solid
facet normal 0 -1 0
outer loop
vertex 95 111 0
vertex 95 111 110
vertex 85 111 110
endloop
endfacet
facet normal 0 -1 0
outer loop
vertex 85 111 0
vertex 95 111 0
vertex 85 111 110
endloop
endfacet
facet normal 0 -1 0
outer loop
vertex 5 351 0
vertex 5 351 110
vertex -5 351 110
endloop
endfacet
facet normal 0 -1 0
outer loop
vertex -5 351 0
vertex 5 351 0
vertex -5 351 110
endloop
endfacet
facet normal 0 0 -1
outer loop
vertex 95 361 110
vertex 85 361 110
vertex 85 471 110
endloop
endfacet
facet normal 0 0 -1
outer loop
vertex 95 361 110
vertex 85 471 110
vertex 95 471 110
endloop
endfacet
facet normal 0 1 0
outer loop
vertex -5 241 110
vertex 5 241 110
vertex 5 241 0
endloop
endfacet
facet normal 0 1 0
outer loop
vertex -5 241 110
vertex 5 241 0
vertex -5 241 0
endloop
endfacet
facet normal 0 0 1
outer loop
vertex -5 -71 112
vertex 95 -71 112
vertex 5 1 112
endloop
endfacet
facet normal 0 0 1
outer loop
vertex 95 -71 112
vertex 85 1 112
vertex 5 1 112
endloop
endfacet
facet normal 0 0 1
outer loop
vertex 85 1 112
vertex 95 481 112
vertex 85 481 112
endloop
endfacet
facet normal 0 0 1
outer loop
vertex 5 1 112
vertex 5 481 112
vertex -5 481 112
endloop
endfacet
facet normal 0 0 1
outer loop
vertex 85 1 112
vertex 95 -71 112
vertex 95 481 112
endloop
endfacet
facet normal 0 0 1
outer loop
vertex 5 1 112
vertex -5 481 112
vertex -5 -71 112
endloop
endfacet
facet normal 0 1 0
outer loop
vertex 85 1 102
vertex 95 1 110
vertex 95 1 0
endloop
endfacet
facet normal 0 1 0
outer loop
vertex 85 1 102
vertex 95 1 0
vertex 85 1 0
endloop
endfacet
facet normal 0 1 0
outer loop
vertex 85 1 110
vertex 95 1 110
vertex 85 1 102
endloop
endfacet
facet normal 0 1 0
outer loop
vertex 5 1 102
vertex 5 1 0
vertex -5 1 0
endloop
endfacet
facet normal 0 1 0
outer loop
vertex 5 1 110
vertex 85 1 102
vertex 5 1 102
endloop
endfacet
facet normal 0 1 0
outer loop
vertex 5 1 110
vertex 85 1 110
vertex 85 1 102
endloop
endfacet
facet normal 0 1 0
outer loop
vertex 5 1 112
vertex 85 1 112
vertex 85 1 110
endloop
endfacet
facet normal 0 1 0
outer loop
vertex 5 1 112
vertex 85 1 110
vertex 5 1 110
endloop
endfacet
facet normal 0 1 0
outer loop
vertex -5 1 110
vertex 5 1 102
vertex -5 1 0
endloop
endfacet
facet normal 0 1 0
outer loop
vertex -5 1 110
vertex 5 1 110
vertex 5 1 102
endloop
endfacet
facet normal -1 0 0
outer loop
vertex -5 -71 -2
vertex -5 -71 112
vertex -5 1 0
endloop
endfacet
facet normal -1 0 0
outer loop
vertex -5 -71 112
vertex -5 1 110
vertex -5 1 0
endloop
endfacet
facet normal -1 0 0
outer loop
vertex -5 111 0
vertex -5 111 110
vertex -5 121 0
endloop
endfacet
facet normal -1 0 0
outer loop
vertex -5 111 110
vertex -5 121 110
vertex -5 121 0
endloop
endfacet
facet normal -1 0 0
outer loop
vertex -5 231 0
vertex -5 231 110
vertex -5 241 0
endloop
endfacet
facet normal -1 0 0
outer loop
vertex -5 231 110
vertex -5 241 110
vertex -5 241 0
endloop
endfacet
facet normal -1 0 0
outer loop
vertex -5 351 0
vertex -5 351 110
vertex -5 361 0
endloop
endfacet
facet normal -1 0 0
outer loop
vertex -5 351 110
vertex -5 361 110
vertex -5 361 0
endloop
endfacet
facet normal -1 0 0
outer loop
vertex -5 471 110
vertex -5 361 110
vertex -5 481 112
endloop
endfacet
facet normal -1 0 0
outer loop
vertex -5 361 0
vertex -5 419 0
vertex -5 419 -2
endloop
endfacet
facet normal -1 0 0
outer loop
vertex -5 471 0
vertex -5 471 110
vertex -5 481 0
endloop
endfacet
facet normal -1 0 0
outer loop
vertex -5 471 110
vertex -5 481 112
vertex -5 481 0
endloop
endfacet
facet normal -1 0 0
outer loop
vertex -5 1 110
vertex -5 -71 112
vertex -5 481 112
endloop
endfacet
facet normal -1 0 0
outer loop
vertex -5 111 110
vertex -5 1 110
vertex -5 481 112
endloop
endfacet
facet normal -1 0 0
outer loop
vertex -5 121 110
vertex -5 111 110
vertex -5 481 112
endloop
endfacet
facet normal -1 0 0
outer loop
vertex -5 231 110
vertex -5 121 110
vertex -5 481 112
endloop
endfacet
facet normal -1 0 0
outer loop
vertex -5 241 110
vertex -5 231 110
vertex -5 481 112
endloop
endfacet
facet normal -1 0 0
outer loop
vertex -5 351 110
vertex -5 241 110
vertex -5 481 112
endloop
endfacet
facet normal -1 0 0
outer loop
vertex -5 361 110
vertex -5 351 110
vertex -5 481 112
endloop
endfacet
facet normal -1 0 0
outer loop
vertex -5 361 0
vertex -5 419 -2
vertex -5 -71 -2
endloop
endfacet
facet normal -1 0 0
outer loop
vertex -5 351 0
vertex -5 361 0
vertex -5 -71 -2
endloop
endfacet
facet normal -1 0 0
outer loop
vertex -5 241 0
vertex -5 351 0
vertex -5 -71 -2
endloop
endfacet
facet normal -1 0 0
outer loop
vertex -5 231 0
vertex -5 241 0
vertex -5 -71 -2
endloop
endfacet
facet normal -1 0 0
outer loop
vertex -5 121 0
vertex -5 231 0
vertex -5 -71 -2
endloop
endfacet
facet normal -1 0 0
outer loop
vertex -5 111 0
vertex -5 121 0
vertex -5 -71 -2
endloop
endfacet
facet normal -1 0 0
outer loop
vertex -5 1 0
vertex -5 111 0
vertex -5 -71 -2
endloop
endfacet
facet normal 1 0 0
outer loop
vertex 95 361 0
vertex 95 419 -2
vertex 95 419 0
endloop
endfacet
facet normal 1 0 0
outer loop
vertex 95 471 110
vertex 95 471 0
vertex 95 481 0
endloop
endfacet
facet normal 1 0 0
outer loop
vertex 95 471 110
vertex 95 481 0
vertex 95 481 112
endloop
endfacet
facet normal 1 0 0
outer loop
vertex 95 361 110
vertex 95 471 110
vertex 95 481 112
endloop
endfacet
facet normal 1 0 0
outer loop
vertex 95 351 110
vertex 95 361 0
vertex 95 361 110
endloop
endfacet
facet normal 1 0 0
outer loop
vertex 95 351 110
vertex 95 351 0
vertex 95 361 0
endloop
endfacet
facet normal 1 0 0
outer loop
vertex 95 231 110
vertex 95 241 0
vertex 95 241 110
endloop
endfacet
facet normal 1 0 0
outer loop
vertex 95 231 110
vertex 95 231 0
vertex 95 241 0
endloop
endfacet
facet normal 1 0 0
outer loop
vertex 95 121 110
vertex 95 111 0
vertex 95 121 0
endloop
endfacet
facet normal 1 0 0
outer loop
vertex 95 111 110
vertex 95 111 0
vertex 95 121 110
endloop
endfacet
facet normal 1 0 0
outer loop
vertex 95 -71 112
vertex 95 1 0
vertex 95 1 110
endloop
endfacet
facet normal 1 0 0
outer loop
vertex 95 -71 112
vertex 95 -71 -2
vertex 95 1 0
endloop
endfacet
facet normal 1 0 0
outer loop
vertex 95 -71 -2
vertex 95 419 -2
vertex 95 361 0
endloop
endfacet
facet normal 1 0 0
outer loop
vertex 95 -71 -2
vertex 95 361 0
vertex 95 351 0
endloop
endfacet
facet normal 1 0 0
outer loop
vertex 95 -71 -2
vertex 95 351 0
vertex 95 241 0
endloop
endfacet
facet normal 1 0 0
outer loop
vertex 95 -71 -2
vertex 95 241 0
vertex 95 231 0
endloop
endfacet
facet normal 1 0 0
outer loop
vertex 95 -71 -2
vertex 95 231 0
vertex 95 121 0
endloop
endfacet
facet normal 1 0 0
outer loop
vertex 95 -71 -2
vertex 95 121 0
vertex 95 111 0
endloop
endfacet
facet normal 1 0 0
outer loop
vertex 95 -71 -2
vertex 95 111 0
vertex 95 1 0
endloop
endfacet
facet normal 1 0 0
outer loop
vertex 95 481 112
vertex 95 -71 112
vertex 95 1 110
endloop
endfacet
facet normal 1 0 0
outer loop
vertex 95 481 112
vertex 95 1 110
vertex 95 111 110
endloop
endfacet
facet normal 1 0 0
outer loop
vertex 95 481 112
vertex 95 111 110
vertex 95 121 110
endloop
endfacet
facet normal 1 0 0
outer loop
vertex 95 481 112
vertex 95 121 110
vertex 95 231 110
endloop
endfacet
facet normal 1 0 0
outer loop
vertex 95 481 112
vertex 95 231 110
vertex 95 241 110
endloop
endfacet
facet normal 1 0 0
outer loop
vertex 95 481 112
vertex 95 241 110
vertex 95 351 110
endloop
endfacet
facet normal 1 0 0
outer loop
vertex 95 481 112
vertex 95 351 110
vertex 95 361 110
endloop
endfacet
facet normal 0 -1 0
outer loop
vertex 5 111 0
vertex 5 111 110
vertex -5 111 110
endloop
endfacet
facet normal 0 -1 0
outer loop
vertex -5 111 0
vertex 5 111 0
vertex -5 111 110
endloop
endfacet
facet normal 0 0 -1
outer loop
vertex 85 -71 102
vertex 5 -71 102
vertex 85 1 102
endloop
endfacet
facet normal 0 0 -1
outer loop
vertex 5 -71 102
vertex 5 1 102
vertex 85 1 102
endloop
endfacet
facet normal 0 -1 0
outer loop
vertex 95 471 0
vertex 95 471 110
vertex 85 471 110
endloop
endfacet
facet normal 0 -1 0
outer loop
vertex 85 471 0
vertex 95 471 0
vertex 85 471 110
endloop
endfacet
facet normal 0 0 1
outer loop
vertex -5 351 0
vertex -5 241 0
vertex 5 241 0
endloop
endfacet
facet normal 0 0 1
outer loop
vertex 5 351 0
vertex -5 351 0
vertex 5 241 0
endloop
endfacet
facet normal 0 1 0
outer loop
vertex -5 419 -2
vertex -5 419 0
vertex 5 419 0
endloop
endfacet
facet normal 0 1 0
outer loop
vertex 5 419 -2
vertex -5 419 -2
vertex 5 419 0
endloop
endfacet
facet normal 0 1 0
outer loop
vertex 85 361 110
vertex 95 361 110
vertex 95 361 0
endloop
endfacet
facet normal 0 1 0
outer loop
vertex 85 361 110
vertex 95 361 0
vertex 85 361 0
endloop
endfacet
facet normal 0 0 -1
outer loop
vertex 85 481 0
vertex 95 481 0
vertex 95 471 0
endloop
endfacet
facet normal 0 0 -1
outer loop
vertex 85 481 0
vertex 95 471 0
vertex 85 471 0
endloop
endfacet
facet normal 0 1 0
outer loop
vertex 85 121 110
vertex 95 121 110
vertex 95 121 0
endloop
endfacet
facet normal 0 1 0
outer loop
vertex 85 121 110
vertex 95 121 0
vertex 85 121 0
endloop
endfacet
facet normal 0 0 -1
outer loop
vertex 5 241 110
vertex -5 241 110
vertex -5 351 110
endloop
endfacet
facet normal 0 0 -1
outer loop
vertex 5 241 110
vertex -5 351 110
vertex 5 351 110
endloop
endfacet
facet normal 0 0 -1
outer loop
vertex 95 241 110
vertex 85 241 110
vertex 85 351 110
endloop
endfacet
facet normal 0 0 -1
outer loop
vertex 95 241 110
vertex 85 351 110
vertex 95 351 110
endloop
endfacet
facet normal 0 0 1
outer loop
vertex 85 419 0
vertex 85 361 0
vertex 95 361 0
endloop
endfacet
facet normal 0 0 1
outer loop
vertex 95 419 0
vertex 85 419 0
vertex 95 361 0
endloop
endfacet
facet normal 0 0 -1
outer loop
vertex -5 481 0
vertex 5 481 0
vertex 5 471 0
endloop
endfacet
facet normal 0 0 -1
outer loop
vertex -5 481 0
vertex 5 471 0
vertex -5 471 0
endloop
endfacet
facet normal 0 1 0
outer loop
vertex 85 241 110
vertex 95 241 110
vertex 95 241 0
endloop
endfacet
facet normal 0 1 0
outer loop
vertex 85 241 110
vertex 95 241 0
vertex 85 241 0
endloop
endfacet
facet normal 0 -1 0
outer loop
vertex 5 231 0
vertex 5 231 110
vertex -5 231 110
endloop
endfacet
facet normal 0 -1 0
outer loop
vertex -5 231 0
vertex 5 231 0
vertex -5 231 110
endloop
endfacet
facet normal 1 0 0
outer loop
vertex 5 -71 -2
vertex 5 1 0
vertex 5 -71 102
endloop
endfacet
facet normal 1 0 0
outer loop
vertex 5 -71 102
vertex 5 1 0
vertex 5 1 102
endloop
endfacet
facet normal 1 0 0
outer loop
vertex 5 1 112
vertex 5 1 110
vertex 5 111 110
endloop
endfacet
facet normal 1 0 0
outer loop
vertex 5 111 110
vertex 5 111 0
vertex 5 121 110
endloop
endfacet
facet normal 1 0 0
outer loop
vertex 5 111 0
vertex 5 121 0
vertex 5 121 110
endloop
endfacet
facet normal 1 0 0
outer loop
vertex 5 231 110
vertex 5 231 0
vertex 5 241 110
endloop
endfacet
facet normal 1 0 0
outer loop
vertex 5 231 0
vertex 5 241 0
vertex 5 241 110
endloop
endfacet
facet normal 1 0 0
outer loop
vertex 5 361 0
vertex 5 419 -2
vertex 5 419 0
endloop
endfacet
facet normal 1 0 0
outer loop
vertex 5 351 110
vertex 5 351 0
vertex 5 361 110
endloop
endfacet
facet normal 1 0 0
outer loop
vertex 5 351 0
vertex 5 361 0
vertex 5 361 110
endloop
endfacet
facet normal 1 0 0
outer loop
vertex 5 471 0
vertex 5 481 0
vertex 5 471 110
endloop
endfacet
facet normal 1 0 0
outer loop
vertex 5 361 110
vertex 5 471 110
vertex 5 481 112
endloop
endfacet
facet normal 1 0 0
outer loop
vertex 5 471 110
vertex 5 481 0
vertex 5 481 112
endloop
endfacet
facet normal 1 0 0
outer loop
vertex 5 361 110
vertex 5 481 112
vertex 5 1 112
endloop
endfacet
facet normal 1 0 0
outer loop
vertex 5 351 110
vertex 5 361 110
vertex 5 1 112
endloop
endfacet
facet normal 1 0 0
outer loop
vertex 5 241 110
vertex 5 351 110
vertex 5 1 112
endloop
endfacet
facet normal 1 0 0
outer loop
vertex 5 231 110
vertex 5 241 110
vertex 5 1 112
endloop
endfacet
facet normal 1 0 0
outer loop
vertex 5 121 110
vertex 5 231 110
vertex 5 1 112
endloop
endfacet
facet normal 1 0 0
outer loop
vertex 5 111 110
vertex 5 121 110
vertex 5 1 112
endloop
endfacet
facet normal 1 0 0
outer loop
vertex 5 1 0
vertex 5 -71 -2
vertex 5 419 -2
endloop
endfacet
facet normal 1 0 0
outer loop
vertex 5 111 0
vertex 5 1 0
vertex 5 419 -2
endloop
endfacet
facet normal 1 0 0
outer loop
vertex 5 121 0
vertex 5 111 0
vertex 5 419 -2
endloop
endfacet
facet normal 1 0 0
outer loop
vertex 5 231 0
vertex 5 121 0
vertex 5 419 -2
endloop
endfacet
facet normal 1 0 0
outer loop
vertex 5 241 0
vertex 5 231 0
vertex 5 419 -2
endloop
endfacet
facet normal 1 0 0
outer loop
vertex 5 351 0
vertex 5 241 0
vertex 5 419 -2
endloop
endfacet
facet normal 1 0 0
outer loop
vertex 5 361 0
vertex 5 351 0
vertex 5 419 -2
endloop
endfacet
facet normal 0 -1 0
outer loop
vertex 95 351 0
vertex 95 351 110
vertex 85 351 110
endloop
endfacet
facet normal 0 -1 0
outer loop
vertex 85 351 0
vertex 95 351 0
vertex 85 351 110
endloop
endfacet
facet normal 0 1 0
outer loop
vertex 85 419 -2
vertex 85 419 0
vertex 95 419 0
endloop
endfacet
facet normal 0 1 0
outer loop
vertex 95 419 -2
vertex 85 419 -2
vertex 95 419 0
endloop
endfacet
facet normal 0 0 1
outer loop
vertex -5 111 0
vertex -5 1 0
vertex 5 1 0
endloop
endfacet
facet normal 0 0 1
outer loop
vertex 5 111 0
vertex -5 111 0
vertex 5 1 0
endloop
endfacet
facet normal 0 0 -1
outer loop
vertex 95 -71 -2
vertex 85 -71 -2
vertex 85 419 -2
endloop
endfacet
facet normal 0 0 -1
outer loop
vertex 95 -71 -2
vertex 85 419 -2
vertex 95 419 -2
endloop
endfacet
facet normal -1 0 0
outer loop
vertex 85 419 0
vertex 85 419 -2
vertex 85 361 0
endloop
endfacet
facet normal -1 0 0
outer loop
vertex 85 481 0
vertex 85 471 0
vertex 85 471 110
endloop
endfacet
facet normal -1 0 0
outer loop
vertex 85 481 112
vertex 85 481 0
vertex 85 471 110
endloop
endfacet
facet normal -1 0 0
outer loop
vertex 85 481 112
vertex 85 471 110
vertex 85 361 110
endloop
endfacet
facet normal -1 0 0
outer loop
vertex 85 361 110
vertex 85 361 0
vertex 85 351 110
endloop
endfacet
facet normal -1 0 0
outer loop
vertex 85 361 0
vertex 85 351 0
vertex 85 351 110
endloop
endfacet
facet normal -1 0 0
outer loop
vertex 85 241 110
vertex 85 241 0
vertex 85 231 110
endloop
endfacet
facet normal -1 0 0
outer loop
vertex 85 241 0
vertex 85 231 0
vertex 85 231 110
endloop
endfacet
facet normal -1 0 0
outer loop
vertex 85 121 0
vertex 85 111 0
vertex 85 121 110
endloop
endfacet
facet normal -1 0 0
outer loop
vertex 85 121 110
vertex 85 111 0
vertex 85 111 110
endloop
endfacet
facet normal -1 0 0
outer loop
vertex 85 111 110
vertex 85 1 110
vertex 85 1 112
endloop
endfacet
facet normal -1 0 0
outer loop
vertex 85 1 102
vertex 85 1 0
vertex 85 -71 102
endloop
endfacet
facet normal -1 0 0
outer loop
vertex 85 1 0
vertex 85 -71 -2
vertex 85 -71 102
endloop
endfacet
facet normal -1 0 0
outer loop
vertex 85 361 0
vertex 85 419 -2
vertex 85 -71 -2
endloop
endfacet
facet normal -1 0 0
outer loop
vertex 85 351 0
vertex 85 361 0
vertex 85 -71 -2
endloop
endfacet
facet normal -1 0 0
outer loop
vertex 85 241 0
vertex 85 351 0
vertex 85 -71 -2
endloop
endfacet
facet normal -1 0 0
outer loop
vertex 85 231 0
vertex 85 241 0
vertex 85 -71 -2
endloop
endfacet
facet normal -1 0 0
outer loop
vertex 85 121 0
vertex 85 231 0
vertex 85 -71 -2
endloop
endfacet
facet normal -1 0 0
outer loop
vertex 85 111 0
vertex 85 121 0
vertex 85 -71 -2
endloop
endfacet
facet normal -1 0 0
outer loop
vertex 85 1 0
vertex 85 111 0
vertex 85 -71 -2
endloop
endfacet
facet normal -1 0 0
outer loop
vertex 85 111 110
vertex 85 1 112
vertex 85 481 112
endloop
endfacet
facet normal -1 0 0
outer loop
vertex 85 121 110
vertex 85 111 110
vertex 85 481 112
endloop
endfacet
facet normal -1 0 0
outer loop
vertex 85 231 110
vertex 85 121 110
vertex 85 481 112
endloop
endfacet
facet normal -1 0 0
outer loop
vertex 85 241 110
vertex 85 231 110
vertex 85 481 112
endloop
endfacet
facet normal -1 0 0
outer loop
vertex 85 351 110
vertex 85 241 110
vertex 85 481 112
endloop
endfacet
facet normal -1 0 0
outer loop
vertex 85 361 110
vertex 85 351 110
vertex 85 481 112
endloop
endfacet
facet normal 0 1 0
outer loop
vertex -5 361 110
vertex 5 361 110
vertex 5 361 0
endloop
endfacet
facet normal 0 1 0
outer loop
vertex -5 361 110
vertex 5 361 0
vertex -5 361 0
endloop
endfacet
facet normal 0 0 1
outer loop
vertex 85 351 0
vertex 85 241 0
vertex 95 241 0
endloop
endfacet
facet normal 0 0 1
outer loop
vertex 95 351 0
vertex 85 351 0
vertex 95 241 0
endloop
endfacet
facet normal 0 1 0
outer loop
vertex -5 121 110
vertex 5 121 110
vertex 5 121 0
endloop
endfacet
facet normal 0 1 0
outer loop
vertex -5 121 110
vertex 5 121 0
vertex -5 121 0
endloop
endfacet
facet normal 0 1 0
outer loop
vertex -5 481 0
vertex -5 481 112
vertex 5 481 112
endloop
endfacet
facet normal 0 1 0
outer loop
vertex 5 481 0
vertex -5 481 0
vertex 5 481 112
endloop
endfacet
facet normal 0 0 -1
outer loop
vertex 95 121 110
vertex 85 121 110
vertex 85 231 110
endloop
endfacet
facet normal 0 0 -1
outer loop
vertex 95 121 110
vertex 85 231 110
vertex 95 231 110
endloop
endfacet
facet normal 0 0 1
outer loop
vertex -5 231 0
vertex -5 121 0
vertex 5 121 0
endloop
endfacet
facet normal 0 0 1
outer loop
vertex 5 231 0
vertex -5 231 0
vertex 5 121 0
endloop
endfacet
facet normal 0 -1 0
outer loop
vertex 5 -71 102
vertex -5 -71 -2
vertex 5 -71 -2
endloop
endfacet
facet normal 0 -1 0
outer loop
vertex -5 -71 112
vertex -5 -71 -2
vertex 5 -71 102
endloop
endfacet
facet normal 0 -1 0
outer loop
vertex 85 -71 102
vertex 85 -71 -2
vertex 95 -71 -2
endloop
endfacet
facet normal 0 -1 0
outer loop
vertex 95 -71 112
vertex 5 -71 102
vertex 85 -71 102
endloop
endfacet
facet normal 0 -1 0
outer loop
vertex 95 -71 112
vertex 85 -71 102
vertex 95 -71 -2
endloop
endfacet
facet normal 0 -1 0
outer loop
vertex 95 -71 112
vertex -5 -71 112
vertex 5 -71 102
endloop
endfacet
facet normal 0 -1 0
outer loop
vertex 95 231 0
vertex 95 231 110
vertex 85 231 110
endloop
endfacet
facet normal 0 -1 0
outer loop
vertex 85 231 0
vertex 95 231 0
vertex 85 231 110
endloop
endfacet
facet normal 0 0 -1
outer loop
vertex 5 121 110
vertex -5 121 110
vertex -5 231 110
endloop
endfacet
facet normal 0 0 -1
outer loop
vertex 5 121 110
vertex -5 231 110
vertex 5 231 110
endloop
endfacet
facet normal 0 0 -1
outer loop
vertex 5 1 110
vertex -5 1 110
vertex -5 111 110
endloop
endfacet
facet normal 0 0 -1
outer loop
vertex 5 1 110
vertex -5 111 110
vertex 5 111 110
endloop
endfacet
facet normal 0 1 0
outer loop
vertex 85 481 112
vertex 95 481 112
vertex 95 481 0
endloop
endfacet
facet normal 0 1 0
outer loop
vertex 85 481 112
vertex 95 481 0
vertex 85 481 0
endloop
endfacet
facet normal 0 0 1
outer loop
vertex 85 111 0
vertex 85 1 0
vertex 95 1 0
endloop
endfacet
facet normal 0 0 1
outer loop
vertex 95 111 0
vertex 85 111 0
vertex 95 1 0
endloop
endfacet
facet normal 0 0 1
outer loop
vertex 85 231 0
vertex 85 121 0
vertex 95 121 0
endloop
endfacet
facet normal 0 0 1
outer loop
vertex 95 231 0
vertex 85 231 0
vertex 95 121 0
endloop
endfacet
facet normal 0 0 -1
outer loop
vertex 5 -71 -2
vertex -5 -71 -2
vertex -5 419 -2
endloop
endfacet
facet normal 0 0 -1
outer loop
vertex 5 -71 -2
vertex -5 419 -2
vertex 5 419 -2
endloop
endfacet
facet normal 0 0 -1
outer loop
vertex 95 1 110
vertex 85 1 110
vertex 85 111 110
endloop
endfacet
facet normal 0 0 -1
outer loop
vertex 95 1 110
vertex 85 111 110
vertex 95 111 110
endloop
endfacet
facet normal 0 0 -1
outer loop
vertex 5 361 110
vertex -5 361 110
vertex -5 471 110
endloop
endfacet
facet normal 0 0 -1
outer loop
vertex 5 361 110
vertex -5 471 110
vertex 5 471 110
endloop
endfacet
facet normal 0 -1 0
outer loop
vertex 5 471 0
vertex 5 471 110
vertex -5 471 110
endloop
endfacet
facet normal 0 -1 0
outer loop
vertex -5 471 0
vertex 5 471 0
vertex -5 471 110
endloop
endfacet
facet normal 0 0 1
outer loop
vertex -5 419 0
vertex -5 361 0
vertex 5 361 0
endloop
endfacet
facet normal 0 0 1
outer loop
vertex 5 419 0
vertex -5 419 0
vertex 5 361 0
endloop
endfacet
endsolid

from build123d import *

# Parameters (mm, degrees)
SKETCH1_W            = 10
SKETCH1_H            = 2
BOSS_EXTRUDE1_DEPTH  = 112
SKETCH2_W            = 10
SKETCH2_H            = 2
BOSS_EXTRUDE2_DEPTH  = 480
SKETCH3_W            = 10
SKETCH3_H            = 2
BOSS_EXTRUDE3_DEPTH  = 90
SKETCH4_W            = 10
SKETCH4_H            = 2
BOSS_EXTRUDE4_DEPTH  = 102
SKETCH5_W            = 10
SKETCH5_H            = 2
BOSS_EXTRUDE5_DEPTH  = 480
SKETCH6_W            = 10
SKETCH6_H            = 10
BOSS_EXTRUDE6_DEPTH  = 110
SKETCH7_W            = 10
SKETCH7_H            = 10
BOSS_EXTRUDE7_DEPTH  = 110
SKETCH8_W            = 10
SKETCH8_H            = 10
BOSS_EXTRUDE8_DEPTH  = 110
SKETCH9_W            = 10
SKETCH9_H            = 10
BOSS_EXTRUDE9_DEPTH  = 110
BOSS_EXTRUDE10_DEPTH = 70
SKETCH12_W           = 10
SKETCH12_H           = 2
BOSS_EXTRUDE11_DEPTH = 490


with BuildPart() as part:
    # Sketch1 → Boss-Extrude1 (new body)
    with BuildSketch(Plane.XY):
        Rectangle(SKETCH1_W, SKETCH1_H)
    extrude(amount=BOSS_EXTRUDE1_DEPTH)

    # Sketch2 → Boss-Extrude2 (add)
    with BuildSketch(Plane(origin=(0, 1, 0), x_dir=(1, 0, 0), z_dir=(0, 1, 0))):
        with Locations((0, -111)):
            Rectangle(SKETCH2_W, SKETCH2_H)
    extrude(amount=BOSS_EXTRUDE2_DEPTH)

    # Sketch3 → Boss-Extrude3 (add)
    with BuildSketch(Plane(origin=(5, 0, 0), x_dir=(0, 0, -1), z_dir=(1, 0, 0))):
        with Locations((-107, 0)):
            Rectangle(SKETCH3_W, SKETCH3_H)
    extrude(amount=BOSS_EXTRUDE3_DEPTH)

    # Sketch4 → Boss-Extrude4 (add)
    with BuildSketch(Plane(origin=(0, 0, 102), x_dir=(-1, 0, 0), z_dir=(0, 0, -1))):
        with Locations((-90, 0)):
            Rectangle(SKETCH4_W, SKETCH4_H)
    extrude(amount=BOSS_EXTRUDE4_DEPTH)

    # Sketch5 → Boss-Extrude5 (add)
    with BuildSketch(Plane(origin=(0, 1, 0), x_dir=(1, 0, 0), z_dir=(0, 1, 0))):
        with Locations((90, -111)):
            Rectangle(SKETCH5_W, SKETCH5_H)
    extrude(amount=BOSS_EXTRUDE5_DEPTH)

    # Sketch6 → Boss-Extrude6 (add)
    with BuildSketch(Plane(origin=(0, 0, 110), x_dir=(-1, 0, 0), z_dir=(0, 0, -1))):
        with Locations((-90, 116)):
            Rectangle(SKETCH6_W, SKETCH6_H)
        with Locations((0, 116)):
            Rectangle(SKETCH6_W, SKETCH6_H)
    extrude(amount=BOSS_EXTRUDE6_DEPTH)

    # Sketch7 → Boss-Extrude7 (add)
    with BuildSketch(Plane(origin=(0, 0, 110), x_dir=(-1, 0, 0), z_dir=(0, 0, -1))):
        with Locations((-90, 236)):
            Rectangle(SKETCH7_W, SKETCH7_H)
        with Locations((0, 236)):
            Rectangle(SKETCH7_W, SKETCH7_H)
    extrude(amount=BOSS_EXTRUDE7_DEPTH)

    # Sketch8 → Boss-Extrude8 (add)
    with BuildSketch(Plane(origin=(0, 0, 110), x_dir=(-1, 0, 0), z_dir=(0, 0, -1))):
        with Locations((-90, 356)):
            Rectangle(SKETCH8_W, SKETCH8_H)
        with Locations((0, 356)):
            Rectangle(SKETCH8_W, SKETCH8_H)
    extrude(amount=BOSS_EXTRUDE8_DEPTH)

    # Sketch9 → Boss-Extrude9 (add)
    with BuildSketch(Plane(origin=(0, 0, 110), x_dir=(-1, 0, 0), z_dir=(0, 0, -1))):
        with Locations((-90, 476)):
            Rectangle(SKETCH9_W, SKETCH9_H)
        with Locations((0, 476)):
            Rectangle(SKETCH9_W, SKETCH9_H)
    extrude(amount=BOSS_EXTRUDE9_DEPTH)

    # Sketch11 → Boss-Extrude10 (add)
    with BuildSketch(Plane.XZ.offset(1)):
        Polygon((-5, 112), (-5, 0), (5, 0), (5, 102), (85, 102), (85, 0), (95, 0), (95, 112), align=None)
    extrude(amount=BOSS_EXTRUDE10_DEPTH)

    # Sketch12 → Boss-Extrude11 (add)
    with BuildSketch(Plane.XZ.offset(71)):
        with Locations((90, -1)):
            Rectangle(SKETCH12_W, SKETCH12_H)
        with Locations((0, -1)):
            Rectangle(SKETCH12_W, SKETCH12_H)
    extrude(amount=-BOSS_EXTRUDE11_DEPTH)


solid = part.part
